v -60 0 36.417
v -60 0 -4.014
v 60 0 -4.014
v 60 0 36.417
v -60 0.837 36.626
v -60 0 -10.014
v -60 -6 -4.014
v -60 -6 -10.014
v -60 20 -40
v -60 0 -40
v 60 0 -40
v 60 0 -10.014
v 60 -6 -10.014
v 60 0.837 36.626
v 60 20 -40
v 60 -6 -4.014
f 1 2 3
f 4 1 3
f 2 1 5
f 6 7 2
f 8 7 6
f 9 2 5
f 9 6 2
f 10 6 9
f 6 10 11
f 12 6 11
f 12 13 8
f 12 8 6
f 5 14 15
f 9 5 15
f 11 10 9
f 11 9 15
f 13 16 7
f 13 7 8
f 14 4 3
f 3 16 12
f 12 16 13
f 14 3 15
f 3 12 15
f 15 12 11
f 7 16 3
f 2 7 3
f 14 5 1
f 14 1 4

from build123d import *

# Parameters (mm, degrees)
SKETCH3_W               = 120
SKETCH3_H               = 80
BOSS_EXTRUDE1_DEPTH     = 20
CUT_EXTRUDE3_DEPTH      = 129.062484749
CUT_EXTRUDE3_DEPTH_BACK = 120
SKETCH5_W               = 6
SKETCH5_H               = 6
BOSS_EXTRUDE2_DEPTH     = 120
SKETCH6_W               = 120
SKETCH6_H               = 3.448417199
CUT_EXTRUDE4_DEPTH      = 10


with BuildPart() as part:
    # Sketch3 → Boss-Extrude1 (new body)
    with BuildSketch(Plane(origin=(0, 0, 0), x_dir=(1, 0, 0), z_dir=(0, 1, 0))):
        Rectangle(SKETCH3_W, SKETCH3_H)
    extrude(amount=BOSS_EXTRUDE1_DEPTH)

    # Sketch4 → Cut-Extrude3 (cut, two sides: drawn at the far end of the back side and taken through both)
    with BuildSketch(Plane(origin=(60, 0, 0), x_dir=(0, 0, -1), z_dir=(1, 0, 0)).offset(-CUT_EXTRUDE3_DEPTH_BACK)):
        Polygon((-40, 20), (-40, 0), (-39.971354494, 0), (40, 20), align=None)
    extrude(amount=CUT_EXTRUDE3_DEPTH + CUT_EXTRUDE3_DEPTH_BACK, mode=Mode.SUBTRACT)

    # Sketch5 → Boss-Extrude2 (add)
    with BuildSketch(Plane(origin=(60, 0, 0), x_dir=(0, 0, -1), z_dir=(1, 0, 0))):
        with Locations((7.014322753, -3)):
            Rectangle(SKETCH5_W, SKETCH5_H)
    extrude(amount=-BOSS_EXTRUDE2_DEPTH)

    # Sketch6 → Cut-Extrude4 (cut)
    with BuildSketch(Plane(origin=(0, 9.407996907, 2.352841706), x_dir=(1, 0, 0), z_dir=(0, 0.9701220558238487, 0.2426173876788501))):
        with Locations((0, -37.052883997)):
            Rectangle(SKETCH6_W, SKETCH6_H)
    extrude(amount=-CUT_EXTRUDE4_DEPTH, mode=Mode.SUBTRACT)


solid = part.part
